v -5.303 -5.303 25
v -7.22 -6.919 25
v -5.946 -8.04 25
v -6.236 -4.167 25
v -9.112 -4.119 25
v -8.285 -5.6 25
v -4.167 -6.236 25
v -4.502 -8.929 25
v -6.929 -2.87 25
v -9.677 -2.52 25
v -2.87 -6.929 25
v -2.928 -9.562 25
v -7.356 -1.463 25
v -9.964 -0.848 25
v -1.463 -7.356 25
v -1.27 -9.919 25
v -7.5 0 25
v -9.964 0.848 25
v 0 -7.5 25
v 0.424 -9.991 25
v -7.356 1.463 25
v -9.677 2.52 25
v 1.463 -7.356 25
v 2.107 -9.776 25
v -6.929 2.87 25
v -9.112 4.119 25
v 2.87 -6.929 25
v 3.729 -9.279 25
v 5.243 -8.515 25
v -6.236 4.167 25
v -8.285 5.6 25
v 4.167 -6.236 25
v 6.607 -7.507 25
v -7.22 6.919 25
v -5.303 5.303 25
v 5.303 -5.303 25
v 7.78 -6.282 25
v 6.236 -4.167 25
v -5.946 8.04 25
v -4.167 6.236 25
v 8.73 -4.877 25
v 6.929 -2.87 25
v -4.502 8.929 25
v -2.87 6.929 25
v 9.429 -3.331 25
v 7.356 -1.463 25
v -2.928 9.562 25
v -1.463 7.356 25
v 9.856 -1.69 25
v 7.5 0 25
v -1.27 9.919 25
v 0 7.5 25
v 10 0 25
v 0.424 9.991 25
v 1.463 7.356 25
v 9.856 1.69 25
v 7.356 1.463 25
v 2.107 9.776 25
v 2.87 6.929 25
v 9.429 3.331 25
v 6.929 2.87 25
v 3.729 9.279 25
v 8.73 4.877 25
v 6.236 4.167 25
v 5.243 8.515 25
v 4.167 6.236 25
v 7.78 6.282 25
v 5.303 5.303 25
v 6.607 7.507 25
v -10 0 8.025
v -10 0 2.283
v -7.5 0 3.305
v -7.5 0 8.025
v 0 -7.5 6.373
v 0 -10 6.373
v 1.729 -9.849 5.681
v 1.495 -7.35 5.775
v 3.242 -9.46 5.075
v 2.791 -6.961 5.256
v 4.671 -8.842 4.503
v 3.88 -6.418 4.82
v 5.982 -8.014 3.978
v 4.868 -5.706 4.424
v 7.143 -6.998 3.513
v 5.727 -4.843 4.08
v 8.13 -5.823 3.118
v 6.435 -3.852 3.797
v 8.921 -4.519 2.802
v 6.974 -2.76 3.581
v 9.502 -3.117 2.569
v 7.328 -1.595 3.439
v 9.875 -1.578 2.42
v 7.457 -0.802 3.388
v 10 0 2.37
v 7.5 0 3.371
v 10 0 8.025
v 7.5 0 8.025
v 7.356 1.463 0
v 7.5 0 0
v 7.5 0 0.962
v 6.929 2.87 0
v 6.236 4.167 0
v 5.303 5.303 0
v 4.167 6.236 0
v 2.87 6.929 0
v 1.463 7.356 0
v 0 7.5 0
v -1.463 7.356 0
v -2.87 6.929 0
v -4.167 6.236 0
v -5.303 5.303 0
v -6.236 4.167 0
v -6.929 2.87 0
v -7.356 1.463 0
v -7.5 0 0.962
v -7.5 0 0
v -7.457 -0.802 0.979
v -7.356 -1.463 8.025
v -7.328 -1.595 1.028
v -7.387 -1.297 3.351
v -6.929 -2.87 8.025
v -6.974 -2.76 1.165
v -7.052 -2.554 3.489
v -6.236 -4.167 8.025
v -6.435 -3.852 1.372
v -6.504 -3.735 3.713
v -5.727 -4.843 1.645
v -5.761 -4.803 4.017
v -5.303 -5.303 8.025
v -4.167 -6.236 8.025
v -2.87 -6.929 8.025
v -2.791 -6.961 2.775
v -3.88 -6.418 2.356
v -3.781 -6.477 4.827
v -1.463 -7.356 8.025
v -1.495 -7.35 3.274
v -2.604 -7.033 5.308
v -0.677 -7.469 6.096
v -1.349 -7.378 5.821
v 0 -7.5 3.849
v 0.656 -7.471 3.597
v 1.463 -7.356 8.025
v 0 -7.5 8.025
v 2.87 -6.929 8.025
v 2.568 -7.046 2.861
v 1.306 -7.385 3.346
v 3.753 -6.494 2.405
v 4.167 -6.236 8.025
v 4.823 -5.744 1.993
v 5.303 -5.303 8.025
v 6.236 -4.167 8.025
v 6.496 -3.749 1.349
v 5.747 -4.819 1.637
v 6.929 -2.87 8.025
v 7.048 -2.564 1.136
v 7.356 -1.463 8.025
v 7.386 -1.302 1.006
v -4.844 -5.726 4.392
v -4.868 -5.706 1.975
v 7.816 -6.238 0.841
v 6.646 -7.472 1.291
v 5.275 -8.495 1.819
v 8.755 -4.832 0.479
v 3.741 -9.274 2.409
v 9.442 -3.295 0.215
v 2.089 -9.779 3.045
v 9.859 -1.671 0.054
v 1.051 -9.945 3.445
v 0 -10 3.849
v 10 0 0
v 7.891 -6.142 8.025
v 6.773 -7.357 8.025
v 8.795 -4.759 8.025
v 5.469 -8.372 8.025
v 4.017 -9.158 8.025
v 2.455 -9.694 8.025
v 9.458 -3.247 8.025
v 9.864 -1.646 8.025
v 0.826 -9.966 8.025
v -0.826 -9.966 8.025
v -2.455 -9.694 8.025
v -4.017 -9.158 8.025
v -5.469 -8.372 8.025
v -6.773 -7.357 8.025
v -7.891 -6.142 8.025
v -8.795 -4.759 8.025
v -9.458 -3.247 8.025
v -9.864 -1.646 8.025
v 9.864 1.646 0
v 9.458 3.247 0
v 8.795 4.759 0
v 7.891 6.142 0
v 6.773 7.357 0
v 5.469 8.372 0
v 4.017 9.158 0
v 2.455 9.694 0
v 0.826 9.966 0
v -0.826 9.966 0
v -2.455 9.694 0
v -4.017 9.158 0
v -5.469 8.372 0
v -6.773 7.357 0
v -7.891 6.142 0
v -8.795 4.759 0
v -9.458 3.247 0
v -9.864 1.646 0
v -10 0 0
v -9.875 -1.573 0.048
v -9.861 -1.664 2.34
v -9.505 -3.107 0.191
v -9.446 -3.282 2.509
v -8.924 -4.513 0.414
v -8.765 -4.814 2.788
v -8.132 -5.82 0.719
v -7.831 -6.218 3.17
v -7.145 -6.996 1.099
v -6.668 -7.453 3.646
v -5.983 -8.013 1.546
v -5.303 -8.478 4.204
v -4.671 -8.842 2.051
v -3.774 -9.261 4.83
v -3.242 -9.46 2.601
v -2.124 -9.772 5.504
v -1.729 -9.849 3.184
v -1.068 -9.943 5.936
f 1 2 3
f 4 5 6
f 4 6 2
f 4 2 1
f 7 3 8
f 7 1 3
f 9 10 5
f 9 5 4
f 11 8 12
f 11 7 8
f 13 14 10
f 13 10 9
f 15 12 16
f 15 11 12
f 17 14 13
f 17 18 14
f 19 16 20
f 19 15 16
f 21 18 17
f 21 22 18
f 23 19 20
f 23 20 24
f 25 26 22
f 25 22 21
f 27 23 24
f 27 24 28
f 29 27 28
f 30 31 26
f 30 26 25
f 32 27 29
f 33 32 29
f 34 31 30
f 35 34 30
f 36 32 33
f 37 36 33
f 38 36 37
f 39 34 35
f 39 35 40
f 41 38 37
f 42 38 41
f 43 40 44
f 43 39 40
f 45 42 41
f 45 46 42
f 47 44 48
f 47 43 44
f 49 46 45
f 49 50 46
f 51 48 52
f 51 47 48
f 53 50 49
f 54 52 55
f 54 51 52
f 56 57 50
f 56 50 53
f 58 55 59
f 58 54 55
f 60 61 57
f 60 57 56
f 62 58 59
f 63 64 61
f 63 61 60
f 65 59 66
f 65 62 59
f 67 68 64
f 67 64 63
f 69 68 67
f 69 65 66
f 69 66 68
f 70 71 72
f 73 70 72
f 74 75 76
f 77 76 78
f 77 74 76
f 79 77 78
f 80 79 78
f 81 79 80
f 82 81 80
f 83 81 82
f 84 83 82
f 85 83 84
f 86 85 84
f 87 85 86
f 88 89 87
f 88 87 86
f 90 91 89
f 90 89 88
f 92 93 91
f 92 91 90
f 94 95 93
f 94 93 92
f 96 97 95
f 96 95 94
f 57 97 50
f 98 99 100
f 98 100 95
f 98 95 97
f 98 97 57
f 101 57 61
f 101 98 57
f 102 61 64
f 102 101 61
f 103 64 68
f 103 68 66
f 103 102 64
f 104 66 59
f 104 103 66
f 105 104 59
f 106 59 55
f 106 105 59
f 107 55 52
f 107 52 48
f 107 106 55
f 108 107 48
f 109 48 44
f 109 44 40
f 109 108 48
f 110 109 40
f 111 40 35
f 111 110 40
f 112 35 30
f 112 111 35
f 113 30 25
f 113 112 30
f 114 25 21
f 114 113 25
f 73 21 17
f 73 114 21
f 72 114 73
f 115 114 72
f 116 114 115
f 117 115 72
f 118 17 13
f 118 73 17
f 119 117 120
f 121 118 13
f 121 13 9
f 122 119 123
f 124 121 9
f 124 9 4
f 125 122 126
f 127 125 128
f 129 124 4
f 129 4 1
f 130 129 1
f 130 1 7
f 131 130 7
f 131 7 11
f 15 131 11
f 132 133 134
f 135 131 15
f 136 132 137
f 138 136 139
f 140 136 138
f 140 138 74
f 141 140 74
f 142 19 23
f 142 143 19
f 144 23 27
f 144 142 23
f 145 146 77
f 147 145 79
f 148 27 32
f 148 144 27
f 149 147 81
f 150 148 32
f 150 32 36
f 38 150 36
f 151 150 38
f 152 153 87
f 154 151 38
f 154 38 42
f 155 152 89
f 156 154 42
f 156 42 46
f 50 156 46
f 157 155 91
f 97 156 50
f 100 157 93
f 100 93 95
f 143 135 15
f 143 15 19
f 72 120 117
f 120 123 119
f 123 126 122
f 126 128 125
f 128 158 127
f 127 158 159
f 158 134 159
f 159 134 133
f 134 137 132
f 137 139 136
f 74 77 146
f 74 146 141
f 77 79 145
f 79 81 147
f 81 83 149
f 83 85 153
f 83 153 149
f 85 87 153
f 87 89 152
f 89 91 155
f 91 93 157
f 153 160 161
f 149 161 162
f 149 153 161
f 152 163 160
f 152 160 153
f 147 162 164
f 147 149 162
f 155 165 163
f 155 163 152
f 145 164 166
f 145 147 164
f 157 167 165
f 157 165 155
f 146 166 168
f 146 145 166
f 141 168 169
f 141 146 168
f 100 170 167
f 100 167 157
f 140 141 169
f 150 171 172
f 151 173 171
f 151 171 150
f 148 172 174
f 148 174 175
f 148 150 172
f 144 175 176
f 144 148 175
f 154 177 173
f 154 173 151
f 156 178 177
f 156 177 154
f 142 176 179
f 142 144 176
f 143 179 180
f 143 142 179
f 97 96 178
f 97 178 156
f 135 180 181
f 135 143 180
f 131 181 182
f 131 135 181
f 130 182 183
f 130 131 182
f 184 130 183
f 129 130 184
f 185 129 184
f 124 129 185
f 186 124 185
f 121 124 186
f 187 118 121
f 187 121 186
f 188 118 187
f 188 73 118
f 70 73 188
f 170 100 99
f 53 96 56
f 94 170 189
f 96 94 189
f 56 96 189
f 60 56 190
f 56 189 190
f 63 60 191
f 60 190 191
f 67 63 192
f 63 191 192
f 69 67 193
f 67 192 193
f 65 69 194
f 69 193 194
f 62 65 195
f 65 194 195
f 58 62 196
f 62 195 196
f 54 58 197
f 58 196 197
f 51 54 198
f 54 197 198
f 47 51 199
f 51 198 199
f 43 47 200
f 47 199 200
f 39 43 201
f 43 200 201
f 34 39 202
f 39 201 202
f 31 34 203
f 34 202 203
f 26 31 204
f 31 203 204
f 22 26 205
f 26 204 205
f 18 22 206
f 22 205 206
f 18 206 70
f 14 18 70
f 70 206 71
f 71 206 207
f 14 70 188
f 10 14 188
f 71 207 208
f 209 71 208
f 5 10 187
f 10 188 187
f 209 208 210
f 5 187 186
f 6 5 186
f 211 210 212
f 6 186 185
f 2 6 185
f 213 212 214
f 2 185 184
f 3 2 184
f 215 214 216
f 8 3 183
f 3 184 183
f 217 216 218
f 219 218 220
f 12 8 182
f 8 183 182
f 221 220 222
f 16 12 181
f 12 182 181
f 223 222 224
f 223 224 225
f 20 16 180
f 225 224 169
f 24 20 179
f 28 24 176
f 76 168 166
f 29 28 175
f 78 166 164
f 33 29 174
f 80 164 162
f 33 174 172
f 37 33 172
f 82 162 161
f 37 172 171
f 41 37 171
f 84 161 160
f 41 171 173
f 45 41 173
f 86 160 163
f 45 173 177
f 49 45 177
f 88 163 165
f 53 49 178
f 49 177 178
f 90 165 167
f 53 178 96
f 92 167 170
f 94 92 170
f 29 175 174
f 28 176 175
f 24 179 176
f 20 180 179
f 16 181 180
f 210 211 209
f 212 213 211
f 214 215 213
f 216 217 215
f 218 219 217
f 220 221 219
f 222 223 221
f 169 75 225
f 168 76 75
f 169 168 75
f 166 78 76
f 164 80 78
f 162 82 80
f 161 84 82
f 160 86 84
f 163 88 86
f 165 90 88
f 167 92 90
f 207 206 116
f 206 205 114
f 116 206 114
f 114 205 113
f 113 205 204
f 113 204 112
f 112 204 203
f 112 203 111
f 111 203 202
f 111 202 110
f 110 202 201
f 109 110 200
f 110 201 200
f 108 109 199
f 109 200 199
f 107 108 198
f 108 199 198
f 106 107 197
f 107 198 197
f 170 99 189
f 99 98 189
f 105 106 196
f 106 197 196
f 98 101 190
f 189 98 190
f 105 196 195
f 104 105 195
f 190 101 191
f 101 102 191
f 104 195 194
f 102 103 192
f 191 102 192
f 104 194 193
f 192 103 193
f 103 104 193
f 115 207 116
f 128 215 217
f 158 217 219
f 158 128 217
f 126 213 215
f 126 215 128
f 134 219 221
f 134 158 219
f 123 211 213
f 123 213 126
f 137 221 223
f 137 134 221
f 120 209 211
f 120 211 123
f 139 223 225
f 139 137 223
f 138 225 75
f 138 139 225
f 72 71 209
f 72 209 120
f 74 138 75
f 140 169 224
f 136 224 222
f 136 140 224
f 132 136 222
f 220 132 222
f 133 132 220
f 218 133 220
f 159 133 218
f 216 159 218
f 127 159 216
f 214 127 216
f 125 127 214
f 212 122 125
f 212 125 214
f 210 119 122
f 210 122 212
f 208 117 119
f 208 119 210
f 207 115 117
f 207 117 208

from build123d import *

# Parameters (mm, degrees)
F0_R     = 10
F0_R_2   = 7.5
F1_DEPTH = 25
F3_DEPTH = 25


with BuildPart() as f1:
    # F0 (on Top) → F1 (new body)
    with BuildSketch(Plane.XY):
        Circle(F0_R)
        Circle(F0_R_2, mode=Mode.SUBTRACT)
    extrude(amount=F1_DEPTH)

    # F2 (on Front) → F3 (cut)
    with BuildSketch(Plane.XZ):
        Polygon((0, 3.849256), (-10, 0), (0, 0), align=None)
        Polygon((0, 3.849256), (0, 0), (10, 0), align=None)
        Polygon((-10, 8.024929), (-10, 2.282619), (0, 6.373282), (0, 8.024929), align=None)
        Polygon((0, 8.024929), (0, 6.373282), (10, 2.369654), (10, 8.024929), align=None)
    extrude(amount=F3_DEPTH, mode=Mode.SUBTRACT)


solid = f1.part
